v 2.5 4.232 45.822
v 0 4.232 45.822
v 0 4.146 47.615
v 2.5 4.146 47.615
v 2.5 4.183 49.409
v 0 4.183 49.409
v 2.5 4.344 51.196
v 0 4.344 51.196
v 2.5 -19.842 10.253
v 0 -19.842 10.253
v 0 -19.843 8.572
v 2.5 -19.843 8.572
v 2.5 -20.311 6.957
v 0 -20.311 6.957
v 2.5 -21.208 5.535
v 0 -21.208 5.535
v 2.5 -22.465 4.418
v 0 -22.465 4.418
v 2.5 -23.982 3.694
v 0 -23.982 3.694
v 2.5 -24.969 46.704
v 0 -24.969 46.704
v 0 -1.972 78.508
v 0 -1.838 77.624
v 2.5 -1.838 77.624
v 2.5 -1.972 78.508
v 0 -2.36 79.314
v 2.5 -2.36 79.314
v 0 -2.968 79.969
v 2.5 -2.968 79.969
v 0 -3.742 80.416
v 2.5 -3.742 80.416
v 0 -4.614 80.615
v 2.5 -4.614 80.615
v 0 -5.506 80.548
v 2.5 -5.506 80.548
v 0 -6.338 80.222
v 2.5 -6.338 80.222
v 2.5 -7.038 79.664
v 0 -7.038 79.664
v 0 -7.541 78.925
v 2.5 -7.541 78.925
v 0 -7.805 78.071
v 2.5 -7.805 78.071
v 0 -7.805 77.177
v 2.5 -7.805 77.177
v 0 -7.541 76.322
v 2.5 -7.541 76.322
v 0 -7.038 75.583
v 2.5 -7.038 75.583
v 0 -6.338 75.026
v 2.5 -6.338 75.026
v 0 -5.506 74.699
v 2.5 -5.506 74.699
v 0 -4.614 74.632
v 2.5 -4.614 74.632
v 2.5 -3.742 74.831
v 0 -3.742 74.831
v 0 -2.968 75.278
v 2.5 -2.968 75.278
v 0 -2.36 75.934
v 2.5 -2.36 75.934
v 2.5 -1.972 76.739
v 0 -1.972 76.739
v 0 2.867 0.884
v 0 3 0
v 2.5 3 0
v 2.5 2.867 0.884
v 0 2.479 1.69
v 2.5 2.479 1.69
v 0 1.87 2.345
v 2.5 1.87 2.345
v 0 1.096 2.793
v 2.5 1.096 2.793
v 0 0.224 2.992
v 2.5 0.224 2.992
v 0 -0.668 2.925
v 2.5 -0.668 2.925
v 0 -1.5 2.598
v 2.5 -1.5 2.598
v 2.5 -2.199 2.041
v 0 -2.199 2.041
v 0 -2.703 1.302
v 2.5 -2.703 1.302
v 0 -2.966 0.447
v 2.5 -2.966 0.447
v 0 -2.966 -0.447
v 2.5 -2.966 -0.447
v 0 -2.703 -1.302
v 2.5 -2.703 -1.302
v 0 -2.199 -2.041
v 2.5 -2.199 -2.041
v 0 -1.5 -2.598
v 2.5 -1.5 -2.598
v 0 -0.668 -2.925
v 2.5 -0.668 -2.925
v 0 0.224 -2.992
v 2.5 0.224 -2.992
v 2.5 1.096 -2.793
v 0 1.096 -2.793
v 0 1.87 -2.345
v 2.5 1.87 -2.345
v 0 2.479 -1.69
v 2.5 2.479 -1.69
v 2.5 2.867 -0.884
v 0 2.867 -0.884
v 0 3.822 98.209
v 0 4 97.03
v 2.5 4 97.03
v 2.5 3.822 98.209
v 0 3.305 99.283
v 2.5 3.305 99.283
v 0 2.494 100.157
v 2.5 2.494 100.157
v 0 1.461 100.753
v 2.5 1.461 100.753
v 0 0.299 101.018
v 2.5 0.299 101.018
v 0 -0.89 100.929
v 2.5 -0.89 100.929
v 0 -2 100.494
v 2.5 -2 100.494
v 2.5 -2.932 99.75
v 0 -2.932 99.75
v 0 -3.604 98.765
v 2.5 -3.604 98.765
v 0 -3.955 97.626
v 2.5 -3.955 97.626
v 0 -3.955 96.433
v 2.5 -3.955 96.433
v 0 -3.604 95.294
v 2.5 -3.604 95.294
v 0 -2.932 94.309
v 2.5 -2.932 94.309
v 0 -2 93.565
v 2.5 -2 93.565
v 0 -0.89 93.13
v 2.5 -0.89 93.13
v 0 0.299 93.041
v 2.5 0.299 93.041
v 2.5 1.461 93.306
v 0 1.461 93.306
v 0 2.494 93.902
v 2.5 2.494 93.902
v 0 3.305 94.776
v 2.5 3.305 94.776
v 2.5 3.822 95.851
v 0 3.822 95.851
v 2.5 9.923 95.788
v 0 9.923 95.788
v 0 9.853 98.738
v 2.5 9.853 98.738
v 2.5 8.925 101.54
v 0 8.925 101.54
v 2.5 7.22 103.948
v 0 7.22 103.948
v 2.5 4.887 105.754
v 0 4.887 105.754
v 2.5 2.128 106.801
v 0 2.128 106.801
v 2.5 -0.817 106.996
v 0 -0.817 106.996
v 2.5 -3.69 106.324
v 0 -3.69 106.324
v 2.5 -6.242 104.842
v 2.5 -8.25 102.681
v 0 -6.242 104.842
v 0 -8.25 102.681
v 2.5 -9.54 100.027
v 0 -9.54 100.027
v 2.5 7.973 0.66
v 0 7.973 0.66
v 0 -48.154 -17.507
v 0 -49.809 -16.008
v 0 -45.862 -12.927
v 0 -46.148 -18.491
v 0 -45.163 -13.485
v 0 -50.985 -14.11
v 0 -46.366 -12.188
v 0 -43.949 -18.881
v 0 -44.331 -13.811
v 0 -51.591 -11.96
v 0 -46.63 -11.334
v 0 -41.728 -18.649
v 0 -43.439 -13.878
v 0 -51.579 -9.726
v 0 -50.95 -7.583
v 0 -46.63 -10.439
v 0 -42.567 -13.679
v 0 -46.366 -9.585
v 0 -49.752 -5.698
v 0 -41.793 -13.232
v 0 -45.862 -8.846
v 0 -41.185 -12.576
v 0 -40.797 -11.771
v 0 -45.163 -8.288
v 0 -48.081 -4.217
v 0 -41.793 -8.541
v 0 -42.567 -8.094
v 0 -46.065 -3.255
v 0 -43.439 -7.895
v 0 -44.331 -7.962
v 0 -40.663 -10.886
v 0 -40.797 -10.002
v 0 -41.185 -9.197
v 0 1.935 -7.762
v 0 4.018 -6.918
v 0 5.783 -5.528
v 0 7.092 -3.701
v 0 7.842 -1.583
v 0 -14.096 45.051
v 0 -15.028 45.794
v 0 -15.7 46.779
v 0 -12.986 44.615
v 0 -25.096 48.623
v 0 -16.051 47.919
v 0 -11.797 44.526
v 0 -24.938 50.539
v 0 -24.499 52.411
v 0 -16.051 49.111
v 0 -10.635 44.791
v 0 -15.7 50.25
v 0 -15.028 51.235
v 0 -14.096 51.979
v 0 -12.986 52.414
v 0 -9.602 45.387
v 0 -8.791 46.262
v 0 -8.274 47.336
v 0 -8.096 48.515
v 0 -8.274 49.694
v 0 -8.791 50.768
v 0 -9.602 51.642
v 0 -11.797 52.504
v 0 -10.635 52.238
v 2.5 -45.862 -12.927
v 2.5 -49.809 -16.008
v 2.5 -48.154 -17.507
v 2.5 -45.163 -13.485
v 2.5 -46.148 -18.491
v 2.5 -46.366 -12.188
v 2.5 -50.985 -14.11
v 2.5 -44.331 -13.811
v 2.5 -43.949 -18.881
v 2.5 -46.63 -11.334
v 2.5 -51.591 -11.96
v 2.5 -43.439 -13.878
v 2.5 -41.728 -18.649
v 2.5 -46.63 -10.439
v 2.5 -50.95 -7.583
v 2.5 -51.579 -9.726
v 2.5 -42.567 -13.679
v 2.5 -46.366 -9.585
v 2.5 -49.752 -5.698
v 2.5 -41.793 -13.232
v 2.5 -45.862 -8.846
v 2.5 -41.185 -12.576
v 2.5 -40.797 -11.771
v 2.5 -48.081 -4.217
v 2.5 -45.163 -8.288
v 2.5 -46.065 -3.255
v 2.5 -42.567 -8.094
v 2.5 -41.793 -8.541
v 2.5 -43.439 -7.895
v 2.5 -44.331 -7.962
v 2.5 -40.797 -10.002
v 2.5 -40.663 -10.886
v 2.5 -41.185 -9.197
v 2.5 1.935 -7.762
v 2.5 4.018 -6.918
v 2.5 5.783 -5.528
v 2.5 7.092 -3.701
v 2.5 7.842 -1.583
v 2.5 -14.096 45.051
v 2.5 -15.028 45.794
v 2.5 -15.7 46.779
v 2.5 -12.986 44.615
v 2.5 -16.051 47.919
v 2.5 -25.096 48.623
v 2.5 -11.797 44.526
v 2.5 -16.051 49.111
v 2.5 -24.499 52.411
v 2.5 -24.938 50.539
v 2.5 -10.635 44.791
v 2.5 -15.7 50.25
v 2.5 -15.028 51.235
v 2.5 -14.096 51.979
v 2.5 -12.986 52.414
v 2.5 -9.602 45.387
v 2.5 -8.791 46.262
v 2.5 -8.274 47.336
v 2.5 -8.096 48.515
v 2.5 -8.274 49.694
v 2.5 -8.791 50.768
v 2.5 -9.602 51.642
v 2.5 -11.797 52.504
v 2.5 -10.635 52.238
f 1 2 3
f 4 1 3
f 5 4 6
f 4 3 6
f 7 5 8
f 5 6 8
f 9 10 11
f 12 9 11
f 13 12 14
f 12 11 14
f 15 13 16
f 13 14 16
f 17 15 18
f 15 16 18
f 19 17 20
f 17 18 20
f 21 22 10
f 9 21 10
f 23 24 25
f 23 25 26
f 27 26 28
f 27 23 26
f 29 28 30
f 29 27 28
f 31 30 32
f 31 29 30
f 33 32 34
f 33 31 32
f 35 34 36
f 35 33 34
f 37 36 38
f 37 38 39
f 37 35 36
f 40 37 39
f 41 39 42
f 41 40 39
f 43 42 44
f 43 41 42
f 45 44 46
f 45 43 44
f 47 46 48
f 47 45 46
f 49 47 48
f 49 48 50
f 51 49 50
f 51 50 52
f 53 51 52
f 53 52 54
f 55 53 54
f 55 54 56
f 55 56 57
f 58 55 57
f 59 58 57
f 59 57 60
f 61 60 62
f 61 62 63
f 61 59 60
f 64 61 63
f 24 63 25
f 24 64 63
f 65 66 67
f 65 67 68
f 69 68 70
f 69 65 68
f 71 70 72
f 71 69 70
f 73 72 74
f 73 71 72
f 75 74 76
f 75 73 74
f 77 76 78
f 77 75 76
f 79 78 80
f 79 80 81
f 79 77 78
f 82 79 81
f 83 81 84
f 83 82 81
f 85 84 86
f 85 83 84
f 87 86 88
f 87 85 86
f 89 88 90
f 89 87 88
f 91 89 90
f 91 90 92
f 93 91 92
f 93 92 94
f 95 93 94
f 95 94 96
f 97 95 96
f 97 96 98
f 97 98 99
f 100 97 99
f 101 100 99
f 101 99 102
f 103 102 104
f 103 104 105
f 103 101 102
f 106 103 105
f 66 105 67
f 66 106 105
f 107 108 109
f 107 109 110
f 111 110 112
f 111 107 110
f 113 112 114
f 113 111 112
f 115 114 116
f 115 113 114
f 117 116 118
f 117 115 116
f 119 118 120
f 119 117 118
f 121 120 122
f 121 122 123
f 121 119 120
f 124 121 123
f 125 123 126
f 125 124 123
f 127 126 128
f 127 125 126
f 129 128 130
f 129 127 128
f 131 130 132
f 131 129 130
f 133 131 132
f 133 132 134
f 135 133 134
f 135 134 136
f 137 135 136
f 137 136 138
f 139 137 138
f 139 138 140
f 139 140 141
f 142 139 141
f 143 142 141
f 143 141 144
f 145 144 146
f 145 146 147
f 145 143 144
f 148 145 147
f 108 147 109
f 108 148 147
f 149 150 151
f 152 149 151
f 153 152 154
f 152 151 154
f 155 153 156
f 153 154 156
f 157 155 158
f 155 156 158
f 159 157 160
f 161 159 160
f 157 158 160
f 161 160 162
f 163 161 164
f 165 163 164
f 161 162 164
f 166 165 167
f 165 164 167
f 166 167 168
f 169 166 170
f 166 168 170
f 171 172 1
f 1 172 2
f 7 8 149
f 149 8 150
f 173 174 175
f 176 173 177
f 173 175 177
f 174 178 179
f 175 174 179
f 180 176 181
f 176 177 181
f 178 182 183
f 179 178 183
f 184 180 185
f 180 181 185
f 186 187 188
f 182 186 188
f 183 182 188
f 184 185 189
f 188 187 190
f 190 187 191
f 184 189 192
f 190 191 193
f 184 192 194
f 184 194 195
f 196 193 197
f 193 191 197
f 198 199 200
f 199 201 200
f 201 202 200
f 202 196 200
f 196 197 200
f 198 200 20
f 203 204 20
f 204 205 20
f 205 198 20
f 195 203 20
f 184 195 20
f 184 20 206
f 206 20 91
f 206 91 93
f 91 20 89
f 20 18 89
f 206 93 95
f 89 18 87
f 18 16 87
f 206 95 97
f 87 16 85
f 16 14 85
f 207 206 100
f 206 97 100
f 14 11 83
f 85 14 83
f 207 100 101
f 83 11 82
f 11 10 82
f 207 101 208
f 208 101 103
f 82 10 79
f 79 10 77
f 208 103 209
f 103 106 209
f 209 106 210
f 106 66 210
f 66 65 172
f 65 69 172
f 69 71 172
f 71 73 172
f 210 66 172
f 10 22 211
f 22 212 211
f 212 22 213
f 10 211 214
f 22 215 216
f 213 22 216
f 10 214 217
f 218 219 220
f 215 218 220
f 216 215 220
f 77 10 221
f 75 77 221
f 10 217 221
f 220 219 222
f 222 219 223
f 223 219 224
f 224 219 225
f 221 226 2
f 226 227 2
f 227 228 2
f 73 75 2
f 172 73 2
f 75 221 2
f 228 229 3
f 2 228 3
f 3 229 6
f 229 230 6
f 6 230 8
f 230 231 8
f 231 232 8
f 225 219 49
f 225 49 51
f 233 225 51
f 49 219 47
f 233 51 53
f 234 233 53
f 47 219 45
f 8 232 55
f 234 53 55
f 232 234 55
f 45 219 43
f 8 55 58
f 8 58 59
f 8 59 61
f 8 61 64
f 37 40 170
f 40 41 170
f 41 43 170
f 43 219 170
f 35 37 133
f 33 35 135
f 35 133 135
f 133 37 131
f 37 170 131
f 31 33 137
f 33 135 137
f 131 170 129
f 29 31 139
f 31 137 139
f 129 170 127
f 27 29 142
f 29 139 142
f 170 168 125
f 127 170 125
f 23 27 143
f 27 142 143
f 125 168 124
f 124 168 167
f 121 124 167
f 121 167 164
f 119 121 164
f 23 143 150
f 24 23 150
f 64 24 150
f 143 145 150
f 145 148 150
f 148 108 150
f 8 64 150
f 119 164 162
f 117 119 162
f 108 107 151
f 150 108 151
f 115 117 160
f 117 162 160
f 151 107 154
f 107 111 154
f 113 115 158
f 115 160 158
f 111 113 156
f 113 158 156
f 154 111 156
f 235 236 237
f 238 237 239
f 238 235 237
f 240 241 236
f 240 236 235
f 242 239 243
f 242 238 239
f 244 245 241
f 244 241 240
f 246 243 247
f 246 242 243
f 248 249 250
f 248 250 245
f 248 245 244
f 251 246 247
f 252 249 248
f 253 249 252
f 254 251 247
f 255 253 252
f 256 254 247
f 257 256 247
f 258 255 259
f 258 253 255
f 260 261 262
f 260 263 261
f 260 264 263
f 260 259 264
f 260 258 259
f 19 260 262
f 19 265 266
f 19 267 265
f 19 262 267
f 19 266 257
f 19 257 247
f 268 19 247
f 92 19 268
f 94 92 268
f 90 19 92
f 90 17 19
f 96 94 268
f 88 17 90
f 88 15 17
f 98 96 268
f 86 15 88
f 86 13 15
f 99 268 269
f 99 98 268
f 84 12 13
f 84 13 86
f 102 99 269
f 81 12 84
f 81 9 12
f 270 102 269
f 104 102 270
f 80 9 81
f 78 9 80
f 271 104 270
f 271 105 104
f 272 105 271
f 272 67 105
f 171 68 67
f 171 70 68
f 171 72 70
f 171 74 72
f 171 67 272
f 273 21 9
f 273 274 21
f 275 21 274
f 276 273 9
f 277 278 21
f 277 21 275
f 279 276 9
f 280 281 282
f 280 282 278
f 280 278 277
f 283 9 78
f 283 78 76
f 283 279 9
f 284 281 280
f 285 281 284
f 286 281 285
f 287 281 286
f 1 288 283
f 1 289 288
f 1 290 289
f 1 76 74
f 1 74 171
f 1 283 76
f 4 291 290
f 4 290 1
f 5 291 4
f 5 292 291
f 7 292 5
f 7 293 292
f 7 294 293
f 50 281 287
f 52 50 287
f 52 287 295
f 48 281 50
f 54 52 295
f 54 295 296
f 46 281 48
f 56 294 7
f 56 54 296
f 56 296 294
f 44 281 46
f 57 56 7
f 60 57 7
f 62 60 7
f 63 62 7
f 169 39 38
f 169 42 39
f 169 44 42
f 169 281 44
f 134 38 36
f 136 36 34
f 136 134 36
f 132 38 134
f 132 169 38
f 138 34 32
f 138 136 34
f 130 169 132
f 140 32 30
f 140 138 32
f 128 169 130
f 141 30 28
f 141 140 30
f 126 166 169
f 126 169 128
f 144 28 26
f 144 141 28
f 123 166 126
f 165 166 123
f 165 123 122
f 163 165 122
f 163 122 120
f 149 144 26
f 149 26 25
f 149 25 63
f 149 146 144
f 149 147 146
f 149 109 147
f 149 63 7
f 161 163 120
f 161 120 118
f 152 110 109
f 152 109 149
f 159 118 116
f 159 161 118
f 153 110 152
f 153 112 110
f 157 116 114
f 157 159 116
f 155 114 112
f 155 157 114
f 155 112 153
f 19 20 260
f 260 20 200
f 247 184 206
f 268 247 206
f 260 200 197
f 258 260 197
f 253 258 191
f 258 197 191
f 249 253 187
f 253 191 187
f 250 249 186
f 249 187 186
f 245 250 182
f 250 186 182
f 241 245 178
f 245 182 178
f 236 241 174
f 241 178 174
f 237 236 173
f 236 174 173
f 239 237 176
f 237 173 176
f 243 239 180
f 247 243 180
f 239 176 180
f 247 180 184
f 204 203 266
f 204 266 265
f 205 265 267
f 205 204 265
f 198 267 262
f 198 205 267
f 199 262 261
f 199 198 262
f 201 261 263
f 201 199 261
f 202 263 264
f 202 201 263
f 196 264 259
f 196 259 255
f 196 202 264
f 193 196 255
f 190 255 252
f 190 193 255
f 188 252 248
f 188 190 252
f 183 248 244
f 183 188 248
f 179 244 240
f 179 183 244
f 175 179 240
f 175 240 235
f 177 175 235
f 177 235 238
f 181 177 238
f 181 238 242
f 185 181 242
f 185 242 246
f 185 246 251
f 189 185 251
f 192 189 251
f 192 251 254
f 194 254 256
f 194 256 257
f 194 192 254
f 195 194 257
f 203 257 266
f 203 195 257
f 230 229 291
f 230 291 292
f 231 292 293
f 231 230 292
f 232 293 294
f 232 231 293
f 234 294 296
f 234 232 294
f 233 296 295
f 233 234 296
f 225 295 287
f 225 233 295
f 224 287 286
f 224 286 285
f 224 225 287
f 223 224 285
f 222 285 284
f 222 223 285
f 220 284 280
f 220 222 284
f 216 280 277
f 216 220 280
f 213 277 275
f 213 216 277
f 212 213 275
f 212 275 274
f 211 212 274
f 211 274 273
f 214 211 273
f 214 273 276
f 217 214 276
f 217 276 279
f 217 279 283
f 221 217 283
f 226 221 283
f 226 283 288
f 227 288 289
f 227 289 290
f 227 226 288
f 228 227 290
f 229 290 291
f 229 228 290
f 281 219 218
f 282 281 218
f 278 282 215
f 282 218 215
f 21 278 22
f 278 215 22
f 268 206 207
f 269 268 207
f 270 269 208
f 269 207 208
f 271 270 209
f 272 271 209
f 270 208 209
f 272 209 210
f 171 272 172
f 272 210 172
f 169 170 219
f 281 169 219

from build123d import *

# Parameters (mm, degrees)
F0_R     = 3
F0_R_2   = 4
F1_DEPTH = 2.5


with BuildPart() as f1:
    # F0 (on Right) → F1 (new body)
    with BuildSketch(Plane.YZ):
        with BuildLine():
            Line((-23.98203, 3.693869), (-46.064754, -3.255427))
            ThreePointArc((-46.064754, -3.255427), (-51.363547, -13.05589), (-41.727933, -18.648851))
            Line((-41.727933, -18.648851), (1.935375, -7.762366))
            ThreePointArc((1.935375, -7.762366), (6.502157, -4.660681), (7.972699, 0.660358))
            Line((7.972699, 0.660358), (4.232059, 45.822225))
            ThreePointArc((4.232059, 45.822225), (4.149011, 48.51186), (4.344404, 51.195673))
            Line((4.344404, 51.195673), (9.922664, 95.788309))
            ThreePointArc((9.922664, 95.788309), (2.127756, 106.800584), (-9.540323, 100.02661))
            Line((-9.540323, 100.02661), (-24.498515, 52.410936))
            ThreePointArc((-24.498515, 52.410936), (-25.05208, 49.583636), (-24.969341, 46.703842))
            Line((-24.969341, 46.703842), (-19.841616, 10.252983))
            ThreePointArc((-19.841616, 10.252983), (-20.709418, 6.214413), (-23.98203, 3.693869))
        make_face()
        with Locations((-43.663308, -10.886485)):
            Circle(F0_R, mode=Mode.SUBTRACT)
        Circle(F0_R, mode=Mode.SUBTRACT)
        with Locations((-12.096095, 48.514786)):
            Circle(F0_R_2, mode=Mode.SUBTRACT)
        with Locations((-4.838438, 77.623658)):
            Circle(F0_R, mode=Mode.SUBTRACT)
        with Locations((0, 97.029573)):
            Circle(F0_R_2, mode=Mode.SUBTRACT)
    extrude(amount=F1_DEPTH)


solid = f1.part
